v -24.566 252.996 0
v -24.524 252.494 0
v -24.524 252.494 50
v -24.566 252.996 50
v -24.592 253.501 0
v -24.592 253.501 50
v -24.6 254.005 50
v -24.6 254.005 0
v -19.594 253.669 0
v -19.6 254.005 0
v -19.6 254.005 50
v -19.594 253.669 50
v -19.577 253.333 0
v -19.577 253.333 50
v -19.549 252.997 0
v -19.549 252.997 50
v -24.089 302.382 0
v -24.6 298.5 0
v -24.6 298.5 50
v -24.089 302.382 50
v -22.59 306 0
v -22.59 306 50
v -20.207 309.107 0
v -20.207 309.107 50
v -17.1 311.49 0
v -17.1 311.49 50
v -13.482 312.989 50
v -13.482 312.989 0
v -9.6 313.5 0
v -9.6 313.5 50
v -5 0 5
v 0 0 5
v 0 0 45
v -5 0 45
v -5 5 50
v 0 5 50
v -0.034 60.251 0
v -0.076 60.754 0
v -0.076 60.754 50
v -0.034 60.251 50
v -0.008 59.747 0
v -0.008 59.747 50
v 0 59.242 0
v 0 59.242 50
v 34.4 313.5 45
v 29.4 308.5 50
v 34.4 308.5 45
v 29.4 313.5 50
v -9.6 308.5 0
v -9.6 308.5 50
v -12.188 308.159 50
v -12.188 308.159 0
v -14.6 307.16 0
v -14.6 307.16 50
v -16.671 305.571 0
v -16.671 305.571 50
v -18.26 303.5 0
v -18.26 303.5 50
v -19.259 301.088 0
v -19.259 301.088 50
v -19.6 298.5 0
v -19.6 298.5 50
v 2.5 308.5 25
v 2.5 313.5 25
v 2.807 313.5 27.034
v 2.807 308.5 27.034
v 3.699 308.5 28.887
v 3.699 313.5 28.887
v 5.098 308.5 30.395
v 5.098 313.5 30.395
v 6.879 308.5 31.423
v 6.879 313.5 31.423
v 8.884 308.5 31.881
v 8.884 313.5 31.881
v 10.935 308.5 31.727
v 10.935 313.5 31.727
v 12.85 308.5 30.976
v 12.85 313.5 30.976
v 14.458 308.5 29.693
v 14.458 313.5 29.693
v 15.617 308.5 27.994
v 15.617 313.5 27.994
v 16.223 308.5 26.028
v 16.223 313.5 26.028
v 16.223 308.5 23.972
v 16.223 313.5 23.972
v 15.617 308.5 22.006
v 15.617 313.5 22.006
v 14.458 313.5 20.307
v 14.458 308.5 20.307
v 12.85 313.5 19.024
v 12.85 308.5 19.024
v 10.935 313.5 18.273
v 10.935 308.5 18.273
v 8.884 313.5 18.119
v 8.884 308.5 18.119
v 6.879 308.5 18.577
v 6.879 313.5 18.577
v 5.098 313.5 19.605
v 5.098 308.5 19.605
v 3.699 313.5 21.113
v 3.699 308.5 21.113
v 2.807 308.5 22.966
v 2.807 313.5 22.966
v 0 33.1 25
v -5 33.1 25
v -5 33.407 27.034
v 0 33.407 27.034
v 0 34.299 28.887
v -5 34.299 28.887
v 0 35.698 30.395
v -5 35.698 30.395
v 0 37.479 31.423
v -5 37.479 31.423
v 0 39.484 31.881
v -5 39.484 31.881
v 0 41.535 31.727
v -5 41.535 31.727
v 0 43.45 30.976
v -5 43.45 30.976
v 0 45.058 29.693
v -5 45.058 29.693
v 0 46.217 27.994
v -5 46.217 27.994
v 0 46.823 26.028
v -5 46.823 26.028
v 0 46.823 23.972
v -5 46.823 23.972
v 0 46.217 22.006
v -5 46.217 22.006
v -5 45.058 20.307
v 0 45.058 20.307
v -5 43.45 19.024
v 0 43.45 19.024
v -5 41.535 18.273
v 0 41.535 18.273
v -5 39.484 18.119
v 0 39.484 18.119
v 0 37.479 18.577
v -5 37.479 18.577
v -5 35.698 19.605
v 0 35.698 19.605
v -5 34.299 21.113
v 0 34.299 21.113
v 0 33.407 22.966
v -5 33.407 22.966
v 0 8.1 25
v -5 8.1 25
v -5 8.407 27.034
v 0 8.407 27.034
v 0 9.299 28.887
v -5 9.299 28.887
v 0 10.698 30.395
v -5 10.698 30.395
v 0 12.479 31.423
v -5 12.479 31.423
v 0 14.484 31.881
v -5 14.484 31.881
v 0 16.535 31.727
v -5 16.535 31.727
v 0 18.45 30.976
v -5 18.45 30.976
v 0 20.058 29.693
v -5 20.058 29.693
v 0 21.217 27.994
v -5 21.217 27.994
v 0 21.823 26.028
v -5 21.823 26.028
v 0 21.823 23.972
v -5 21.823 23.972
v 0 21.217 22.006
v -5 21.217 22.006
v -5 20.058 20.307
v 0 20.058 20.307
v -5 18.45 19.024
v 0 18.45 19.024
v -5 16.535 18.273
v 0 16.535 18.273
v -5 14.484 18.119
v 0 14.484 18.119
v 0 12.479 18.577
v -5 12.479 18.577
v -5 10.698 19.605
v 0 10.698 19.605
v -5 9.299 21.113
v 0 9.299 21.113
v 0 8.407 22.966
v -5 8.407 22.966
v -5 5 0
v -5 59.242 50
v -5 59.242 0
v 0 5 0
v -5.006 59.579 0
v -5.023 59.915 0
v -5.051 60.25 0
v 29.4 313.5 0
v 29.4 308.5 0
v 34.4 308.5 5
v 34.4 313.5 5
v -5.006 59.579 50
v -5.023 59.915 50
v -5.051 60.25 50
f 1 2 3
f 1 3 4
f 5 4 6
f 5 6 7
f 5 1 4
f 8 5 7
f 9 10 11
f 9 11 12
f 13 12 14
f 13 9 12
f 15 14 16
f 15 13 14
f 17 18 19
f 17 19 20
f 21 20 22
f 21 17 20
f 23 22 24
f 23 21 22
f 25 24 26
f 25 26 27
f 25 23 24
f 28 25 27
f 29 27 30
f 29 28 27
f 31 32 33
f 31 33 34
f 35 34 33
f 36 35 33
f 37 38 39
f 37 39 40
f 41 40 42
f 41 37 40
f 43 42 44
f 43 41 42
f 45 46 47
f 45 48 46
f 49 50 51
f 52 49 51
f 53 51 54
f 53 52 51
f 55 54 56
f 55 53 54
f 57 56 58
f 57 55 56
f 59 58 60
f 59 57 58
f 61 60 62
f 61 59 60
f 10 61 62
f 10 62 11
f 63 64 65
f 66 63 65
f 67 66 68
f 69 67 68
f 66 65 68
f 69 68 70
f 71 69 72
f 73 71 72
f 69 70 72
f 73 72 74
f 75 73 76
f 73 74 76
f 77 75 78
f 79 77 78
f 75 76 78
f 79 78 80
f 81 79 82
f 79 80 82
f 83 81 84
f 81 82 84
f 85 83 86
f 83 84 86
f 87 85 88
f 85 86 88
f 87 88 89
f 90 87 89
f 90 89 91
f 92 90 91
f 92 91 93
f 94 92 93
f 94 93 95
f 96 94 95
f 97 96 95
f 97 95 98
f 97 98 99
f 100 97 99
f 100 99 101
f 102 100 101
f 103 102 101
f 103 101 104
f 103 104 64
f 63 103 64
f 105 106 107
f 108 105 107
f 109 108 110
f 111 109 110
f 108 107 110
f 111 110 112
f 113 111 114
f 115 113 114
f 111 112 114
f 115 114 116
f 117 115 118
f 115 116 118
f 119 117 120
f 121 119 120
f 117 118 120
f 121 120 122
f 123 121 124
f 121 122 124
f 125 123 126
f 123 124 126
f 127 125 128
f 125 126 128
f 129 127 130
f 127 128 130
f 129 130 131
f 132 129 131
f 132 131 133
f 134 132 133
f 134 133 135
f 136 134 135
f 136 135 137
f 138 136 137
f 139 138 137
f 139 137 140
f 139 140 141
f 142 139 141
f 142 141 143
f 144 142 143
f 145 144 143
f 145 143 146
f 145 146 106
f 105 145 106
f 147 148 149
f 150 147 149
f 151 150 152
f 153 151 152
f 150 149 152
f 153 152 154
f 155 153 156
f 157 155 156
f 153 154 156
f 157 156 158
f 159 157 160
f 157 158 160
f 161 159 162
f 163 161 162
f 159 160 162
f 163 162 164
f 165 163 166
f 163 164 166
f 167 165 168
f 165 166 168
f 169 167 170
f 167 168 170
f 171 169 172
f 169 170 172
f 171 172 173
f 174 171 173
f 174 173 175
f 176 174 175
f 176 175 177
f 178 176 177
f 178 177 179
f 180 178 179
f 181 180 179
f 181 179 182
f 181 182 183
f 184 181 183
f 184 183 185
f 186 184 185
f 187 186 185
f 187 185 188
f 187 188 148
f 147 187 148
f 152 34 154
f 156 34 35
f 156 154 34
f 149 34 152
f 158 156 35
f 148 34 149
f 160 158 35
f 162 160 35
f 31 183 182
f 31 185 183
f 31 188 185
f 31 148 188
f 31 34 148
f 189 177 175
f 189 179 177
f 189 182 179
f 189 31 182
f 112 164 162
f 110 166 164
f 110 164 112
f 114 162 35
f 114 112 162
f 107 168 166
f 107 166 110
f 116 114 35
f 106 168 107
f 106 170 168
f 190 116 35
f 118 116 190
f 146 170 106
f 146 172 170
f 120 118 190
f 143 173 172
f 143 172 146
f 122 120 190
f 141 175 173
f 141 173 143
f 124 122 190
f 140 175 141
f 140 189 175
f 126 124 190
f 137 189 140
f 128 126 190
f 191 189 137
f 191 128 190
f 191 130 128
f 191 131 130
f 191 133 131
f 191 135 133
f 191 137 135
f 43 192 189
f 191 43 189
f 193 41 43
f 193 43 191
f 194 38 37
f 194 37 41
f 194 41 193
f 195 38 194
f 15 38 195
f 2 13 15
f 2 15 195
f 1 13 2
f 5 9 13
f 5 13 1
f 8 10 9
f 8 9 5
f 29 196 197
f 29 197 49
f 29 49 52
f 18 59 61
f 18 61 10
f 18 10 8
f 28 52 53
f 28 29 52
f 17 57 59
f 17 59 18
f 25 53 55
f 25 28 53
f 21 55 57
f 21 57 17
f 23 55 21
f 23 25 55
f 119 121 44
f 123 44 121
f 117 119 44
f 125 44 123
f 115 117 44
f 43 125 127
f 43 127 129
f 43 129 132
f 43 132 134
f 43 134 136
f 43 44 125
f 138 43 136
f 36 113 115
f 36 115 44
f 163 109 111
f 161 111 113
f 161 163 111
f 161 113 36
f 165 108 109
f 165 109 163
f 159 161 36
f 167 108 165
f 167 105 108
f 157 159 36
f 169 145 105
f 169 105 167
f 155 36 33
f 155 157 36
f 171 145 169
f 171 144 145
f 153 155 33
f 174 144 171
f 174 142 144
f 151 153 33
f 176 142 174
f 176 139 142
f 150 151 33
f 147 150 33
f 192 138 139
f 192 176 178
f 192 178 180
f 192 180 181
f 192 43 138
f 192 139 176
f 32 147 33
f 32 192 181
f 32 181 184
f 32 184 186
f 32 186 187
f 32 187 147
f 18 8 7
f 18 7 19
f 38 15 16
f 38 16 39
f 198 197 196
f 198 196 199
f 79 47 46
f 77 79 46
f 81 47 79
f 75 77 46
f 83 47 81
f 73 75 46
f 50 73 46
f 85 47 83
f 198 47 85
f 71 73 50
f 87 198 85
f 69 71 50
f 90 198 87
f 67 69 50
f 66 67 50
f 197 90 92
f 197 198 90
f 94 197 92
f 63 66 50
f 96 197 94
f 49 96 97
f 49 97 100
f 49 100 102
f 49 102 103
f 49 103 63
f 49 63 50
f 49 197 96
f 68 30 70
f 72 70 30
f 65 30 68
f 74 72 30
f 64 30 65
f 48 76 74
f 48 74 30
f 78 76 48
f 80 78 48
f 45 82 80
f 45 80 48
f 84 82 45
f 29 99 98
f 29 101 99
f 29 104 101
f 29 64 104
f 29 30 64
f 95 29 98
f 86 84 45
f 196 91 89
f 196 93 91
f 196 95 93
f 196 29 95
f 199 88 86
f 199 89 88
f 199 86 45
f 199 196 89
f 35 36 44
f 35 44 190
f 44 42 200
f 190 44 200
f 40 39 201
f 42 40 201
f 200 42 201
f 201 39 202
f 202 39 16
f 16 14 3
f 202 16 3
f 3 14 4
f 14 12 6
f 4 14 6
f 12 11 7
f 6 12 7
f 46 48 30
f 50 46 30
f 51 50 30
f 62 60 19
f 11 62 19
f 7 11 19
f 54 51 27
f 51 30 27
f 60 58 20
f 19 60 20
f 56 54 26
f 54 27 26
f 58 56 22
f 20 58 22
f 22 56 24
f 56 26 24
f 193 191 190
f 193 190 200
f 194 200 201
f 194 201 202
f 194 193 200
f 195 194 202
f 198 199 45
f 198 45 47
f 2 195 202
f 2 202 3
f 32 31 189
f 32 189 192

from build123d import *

# Parameters (mm, degrees)
SM_BASE_FLANGE_1_DEPTH = 50
SKETCH_6_R             = 6.9
CUT_EXTRUDE_1_DEPTH    = 10
SKETCH_7_R             = 6.9
CUT_EXTRUDE_2_DEPTH    = 10
OTHER_START            = 20.788939367
OTHER_1_OUTLINE_W      = 10
OTHER_1_OUTLINE_H      = 8
OTHER_1_DEPTH          = 3.535533906
OTHER_START_2          = 56.144278426
OTHER_1_2_OUTLINE_W    = 38
OTHER_1_2_OUTLINE_H    = 8
OTHER_1_2_DEPTH        = 3.535533906
OTHER_1_3_OUTLINE_W    = 7
OTHER_1_3_OUTLINE_H    = 10
OTHER_1_3_DEPTH        = 3.535533906
OTHER_START_3          = -35.355339059
OTHER_1_4_OUTLINE_W    = 7
OTHER_1_4_OUTLINE_H    = 38
OTHER_1_4_DEPTH        = 3.535533906


# Read off the part's stored shape, not the designer's step: Затупленный угол1
# Sheet-metal steps are written as plain solids
with BuildPart() as part:
    # Sketch 1 → Базовая кромка1 (new body)
    with BuildSketch(Plane.XY):
        with BuildLine():
            Line((34.4, 308.5), (-9.6, 308.5))
            ThreePointArc((-9.6, 308.5), (-16.671067812, 305.571067812), (-19.6, 298.5))
            Line((-19.6, 298.5), (-19.6, 254.005167492))
            ThreePointArc((-19.6, 254.005167492), (-19.58726466, 253.500643348), (-19.549091078, 252.997404261))
            Line((-19.549091078, 252.997404261), (-0.076363384, 60.753893608))
            ThreePointArc((-0.076363384, 60.753893608), (-0.01910301, 59.999034978), (0, 59.242248762))
            Line((0, 59.242248762), (0, 0))
            Line((0, 0), (-5, 0))
            Line((-5, 0), (-5, 59.242248762))
            ThreePointArc((-5, 59.242248762), (-5.01273534, 59.746772906), (-5.050908922, 60.250011993))
            Line((-5.050908922, 60.250011993), (-24.523636616, 252.493522646))
            ThreePointArc((-24.523636616, 252.493522646), (-24.58089699, 253.248381276), (-24.6, 254.005167492))
            Line((-24.6, 254.005167492), (-24.6, 298.5))
            ThreePointArc((-24.6, 298.5), (-20.206601718, 309.106601718), (-9.6, 313.5))
            Line((-9.6, 313.5), (34.4, 313.5))
            Line((34.4, 313.5), (34.4, 308.5))
        make_face()
    extrude(amount=SM_BASE_FLANGE_1_DEPTH)

    # Эскиз6 → Вырез-Вытянуть1 (cut)
    with BuildSketch(Plane.ZY.offset(5)):
        with Locations(Location((25, 15, 0), (0, 0, 270))):
            Circle(SKETCH_6_R)
        with Locations(Location((25, 40, 0), (0, 0, 270))):
            Circle(SKETCH_6_R)
    extrude(amount=-CUT_EXTRUDE_1_DEPTH, mode=Mode.SUBTRACT)

    # Эскиз7 → Вырез-Вытянуть2 (cut)
    with BuildSketch(Plane(origin=(0, 313.5, 0), x_dir=(1, 0, 0), z_dir=(0, 1, 0))):
        with Locations(Location((9.4, -25, 0), (0, 0, 180))):
            Circle(SKETCH_7_R)
    extrude(amount=-CUT_EXTRUDE_2_DEPTH, mode=Mode.SUBTRACT)

    # Other 1 outline → Other 1 (cut)
    with BuildSketch(Plane(origin=(0, 0, 0), x_dir=(0.707106781186548, 0, 0.707106781186547), z_dir=(0.707106781186547, 0, -0.707106781186548)).offset(OTHER_START)):
        with Locations((24, -311)):
            Rectangle(OTHER_1_OUTLINE_W, OTHER_1_OUTLINE_H)
    extrude(amount=OTHER_1_DEPTH, mode=Mode.SUBTRACT)

    # Other 1 2 outline → Other 1 2 (cut)
    with BuildSketch(Plane(origin=(0, 0, 0), x_dir=(0.707106781186548, 0, -0.707106781186547), z_dir=(0.707106781186547, 0, 0.707106781186548)).offset(OTHER_START_2)):
        with Locations((3, 311)):
            Rectangle(OTHER_1_2_OUTLINE_W, OTHER_1_2_OUTLINE_H)
    extrude(amount=OTHER_1_2_DEPTH, mode=Mode.SUBTRACT)

    # Other 1 3 outline → Other 1 3 (cut)
    with BuildSketch(Plane(origin=(0, 0, 0), x_dir=(1, 0, 0), z_dir=(0, 0.7071067811865476, 0.7071067811865476))):
        with Locations((-2.5, 0)):
            Rectangle(OTHER_1_3_OUTLINE_W, OTHER_1_3_OUTLINE_H)
    extrude(amount=OTHER_1_3_DEPTH, mode=Mode.SUBTRACT)

    # Other 1 4 outline → Other 1 4 (cut)
    with BuildSketch(Plane(origin=(0, 0, 0), x_dir=(1, 0, 0), z_dir=(0, 0.7071067811865476, -0.7071067811865476)).offset(OTHER_START_3)):
        with Locations((-2.5, -21)):
            Rectangle(OTHER_1_4_OUTLINE_W, OTHER_1_4_OUTLINE_H)
    extrude(amount=OTHER_1_4_DEPTH, mode=Mode.SUBTRACT)


solid = part.part
